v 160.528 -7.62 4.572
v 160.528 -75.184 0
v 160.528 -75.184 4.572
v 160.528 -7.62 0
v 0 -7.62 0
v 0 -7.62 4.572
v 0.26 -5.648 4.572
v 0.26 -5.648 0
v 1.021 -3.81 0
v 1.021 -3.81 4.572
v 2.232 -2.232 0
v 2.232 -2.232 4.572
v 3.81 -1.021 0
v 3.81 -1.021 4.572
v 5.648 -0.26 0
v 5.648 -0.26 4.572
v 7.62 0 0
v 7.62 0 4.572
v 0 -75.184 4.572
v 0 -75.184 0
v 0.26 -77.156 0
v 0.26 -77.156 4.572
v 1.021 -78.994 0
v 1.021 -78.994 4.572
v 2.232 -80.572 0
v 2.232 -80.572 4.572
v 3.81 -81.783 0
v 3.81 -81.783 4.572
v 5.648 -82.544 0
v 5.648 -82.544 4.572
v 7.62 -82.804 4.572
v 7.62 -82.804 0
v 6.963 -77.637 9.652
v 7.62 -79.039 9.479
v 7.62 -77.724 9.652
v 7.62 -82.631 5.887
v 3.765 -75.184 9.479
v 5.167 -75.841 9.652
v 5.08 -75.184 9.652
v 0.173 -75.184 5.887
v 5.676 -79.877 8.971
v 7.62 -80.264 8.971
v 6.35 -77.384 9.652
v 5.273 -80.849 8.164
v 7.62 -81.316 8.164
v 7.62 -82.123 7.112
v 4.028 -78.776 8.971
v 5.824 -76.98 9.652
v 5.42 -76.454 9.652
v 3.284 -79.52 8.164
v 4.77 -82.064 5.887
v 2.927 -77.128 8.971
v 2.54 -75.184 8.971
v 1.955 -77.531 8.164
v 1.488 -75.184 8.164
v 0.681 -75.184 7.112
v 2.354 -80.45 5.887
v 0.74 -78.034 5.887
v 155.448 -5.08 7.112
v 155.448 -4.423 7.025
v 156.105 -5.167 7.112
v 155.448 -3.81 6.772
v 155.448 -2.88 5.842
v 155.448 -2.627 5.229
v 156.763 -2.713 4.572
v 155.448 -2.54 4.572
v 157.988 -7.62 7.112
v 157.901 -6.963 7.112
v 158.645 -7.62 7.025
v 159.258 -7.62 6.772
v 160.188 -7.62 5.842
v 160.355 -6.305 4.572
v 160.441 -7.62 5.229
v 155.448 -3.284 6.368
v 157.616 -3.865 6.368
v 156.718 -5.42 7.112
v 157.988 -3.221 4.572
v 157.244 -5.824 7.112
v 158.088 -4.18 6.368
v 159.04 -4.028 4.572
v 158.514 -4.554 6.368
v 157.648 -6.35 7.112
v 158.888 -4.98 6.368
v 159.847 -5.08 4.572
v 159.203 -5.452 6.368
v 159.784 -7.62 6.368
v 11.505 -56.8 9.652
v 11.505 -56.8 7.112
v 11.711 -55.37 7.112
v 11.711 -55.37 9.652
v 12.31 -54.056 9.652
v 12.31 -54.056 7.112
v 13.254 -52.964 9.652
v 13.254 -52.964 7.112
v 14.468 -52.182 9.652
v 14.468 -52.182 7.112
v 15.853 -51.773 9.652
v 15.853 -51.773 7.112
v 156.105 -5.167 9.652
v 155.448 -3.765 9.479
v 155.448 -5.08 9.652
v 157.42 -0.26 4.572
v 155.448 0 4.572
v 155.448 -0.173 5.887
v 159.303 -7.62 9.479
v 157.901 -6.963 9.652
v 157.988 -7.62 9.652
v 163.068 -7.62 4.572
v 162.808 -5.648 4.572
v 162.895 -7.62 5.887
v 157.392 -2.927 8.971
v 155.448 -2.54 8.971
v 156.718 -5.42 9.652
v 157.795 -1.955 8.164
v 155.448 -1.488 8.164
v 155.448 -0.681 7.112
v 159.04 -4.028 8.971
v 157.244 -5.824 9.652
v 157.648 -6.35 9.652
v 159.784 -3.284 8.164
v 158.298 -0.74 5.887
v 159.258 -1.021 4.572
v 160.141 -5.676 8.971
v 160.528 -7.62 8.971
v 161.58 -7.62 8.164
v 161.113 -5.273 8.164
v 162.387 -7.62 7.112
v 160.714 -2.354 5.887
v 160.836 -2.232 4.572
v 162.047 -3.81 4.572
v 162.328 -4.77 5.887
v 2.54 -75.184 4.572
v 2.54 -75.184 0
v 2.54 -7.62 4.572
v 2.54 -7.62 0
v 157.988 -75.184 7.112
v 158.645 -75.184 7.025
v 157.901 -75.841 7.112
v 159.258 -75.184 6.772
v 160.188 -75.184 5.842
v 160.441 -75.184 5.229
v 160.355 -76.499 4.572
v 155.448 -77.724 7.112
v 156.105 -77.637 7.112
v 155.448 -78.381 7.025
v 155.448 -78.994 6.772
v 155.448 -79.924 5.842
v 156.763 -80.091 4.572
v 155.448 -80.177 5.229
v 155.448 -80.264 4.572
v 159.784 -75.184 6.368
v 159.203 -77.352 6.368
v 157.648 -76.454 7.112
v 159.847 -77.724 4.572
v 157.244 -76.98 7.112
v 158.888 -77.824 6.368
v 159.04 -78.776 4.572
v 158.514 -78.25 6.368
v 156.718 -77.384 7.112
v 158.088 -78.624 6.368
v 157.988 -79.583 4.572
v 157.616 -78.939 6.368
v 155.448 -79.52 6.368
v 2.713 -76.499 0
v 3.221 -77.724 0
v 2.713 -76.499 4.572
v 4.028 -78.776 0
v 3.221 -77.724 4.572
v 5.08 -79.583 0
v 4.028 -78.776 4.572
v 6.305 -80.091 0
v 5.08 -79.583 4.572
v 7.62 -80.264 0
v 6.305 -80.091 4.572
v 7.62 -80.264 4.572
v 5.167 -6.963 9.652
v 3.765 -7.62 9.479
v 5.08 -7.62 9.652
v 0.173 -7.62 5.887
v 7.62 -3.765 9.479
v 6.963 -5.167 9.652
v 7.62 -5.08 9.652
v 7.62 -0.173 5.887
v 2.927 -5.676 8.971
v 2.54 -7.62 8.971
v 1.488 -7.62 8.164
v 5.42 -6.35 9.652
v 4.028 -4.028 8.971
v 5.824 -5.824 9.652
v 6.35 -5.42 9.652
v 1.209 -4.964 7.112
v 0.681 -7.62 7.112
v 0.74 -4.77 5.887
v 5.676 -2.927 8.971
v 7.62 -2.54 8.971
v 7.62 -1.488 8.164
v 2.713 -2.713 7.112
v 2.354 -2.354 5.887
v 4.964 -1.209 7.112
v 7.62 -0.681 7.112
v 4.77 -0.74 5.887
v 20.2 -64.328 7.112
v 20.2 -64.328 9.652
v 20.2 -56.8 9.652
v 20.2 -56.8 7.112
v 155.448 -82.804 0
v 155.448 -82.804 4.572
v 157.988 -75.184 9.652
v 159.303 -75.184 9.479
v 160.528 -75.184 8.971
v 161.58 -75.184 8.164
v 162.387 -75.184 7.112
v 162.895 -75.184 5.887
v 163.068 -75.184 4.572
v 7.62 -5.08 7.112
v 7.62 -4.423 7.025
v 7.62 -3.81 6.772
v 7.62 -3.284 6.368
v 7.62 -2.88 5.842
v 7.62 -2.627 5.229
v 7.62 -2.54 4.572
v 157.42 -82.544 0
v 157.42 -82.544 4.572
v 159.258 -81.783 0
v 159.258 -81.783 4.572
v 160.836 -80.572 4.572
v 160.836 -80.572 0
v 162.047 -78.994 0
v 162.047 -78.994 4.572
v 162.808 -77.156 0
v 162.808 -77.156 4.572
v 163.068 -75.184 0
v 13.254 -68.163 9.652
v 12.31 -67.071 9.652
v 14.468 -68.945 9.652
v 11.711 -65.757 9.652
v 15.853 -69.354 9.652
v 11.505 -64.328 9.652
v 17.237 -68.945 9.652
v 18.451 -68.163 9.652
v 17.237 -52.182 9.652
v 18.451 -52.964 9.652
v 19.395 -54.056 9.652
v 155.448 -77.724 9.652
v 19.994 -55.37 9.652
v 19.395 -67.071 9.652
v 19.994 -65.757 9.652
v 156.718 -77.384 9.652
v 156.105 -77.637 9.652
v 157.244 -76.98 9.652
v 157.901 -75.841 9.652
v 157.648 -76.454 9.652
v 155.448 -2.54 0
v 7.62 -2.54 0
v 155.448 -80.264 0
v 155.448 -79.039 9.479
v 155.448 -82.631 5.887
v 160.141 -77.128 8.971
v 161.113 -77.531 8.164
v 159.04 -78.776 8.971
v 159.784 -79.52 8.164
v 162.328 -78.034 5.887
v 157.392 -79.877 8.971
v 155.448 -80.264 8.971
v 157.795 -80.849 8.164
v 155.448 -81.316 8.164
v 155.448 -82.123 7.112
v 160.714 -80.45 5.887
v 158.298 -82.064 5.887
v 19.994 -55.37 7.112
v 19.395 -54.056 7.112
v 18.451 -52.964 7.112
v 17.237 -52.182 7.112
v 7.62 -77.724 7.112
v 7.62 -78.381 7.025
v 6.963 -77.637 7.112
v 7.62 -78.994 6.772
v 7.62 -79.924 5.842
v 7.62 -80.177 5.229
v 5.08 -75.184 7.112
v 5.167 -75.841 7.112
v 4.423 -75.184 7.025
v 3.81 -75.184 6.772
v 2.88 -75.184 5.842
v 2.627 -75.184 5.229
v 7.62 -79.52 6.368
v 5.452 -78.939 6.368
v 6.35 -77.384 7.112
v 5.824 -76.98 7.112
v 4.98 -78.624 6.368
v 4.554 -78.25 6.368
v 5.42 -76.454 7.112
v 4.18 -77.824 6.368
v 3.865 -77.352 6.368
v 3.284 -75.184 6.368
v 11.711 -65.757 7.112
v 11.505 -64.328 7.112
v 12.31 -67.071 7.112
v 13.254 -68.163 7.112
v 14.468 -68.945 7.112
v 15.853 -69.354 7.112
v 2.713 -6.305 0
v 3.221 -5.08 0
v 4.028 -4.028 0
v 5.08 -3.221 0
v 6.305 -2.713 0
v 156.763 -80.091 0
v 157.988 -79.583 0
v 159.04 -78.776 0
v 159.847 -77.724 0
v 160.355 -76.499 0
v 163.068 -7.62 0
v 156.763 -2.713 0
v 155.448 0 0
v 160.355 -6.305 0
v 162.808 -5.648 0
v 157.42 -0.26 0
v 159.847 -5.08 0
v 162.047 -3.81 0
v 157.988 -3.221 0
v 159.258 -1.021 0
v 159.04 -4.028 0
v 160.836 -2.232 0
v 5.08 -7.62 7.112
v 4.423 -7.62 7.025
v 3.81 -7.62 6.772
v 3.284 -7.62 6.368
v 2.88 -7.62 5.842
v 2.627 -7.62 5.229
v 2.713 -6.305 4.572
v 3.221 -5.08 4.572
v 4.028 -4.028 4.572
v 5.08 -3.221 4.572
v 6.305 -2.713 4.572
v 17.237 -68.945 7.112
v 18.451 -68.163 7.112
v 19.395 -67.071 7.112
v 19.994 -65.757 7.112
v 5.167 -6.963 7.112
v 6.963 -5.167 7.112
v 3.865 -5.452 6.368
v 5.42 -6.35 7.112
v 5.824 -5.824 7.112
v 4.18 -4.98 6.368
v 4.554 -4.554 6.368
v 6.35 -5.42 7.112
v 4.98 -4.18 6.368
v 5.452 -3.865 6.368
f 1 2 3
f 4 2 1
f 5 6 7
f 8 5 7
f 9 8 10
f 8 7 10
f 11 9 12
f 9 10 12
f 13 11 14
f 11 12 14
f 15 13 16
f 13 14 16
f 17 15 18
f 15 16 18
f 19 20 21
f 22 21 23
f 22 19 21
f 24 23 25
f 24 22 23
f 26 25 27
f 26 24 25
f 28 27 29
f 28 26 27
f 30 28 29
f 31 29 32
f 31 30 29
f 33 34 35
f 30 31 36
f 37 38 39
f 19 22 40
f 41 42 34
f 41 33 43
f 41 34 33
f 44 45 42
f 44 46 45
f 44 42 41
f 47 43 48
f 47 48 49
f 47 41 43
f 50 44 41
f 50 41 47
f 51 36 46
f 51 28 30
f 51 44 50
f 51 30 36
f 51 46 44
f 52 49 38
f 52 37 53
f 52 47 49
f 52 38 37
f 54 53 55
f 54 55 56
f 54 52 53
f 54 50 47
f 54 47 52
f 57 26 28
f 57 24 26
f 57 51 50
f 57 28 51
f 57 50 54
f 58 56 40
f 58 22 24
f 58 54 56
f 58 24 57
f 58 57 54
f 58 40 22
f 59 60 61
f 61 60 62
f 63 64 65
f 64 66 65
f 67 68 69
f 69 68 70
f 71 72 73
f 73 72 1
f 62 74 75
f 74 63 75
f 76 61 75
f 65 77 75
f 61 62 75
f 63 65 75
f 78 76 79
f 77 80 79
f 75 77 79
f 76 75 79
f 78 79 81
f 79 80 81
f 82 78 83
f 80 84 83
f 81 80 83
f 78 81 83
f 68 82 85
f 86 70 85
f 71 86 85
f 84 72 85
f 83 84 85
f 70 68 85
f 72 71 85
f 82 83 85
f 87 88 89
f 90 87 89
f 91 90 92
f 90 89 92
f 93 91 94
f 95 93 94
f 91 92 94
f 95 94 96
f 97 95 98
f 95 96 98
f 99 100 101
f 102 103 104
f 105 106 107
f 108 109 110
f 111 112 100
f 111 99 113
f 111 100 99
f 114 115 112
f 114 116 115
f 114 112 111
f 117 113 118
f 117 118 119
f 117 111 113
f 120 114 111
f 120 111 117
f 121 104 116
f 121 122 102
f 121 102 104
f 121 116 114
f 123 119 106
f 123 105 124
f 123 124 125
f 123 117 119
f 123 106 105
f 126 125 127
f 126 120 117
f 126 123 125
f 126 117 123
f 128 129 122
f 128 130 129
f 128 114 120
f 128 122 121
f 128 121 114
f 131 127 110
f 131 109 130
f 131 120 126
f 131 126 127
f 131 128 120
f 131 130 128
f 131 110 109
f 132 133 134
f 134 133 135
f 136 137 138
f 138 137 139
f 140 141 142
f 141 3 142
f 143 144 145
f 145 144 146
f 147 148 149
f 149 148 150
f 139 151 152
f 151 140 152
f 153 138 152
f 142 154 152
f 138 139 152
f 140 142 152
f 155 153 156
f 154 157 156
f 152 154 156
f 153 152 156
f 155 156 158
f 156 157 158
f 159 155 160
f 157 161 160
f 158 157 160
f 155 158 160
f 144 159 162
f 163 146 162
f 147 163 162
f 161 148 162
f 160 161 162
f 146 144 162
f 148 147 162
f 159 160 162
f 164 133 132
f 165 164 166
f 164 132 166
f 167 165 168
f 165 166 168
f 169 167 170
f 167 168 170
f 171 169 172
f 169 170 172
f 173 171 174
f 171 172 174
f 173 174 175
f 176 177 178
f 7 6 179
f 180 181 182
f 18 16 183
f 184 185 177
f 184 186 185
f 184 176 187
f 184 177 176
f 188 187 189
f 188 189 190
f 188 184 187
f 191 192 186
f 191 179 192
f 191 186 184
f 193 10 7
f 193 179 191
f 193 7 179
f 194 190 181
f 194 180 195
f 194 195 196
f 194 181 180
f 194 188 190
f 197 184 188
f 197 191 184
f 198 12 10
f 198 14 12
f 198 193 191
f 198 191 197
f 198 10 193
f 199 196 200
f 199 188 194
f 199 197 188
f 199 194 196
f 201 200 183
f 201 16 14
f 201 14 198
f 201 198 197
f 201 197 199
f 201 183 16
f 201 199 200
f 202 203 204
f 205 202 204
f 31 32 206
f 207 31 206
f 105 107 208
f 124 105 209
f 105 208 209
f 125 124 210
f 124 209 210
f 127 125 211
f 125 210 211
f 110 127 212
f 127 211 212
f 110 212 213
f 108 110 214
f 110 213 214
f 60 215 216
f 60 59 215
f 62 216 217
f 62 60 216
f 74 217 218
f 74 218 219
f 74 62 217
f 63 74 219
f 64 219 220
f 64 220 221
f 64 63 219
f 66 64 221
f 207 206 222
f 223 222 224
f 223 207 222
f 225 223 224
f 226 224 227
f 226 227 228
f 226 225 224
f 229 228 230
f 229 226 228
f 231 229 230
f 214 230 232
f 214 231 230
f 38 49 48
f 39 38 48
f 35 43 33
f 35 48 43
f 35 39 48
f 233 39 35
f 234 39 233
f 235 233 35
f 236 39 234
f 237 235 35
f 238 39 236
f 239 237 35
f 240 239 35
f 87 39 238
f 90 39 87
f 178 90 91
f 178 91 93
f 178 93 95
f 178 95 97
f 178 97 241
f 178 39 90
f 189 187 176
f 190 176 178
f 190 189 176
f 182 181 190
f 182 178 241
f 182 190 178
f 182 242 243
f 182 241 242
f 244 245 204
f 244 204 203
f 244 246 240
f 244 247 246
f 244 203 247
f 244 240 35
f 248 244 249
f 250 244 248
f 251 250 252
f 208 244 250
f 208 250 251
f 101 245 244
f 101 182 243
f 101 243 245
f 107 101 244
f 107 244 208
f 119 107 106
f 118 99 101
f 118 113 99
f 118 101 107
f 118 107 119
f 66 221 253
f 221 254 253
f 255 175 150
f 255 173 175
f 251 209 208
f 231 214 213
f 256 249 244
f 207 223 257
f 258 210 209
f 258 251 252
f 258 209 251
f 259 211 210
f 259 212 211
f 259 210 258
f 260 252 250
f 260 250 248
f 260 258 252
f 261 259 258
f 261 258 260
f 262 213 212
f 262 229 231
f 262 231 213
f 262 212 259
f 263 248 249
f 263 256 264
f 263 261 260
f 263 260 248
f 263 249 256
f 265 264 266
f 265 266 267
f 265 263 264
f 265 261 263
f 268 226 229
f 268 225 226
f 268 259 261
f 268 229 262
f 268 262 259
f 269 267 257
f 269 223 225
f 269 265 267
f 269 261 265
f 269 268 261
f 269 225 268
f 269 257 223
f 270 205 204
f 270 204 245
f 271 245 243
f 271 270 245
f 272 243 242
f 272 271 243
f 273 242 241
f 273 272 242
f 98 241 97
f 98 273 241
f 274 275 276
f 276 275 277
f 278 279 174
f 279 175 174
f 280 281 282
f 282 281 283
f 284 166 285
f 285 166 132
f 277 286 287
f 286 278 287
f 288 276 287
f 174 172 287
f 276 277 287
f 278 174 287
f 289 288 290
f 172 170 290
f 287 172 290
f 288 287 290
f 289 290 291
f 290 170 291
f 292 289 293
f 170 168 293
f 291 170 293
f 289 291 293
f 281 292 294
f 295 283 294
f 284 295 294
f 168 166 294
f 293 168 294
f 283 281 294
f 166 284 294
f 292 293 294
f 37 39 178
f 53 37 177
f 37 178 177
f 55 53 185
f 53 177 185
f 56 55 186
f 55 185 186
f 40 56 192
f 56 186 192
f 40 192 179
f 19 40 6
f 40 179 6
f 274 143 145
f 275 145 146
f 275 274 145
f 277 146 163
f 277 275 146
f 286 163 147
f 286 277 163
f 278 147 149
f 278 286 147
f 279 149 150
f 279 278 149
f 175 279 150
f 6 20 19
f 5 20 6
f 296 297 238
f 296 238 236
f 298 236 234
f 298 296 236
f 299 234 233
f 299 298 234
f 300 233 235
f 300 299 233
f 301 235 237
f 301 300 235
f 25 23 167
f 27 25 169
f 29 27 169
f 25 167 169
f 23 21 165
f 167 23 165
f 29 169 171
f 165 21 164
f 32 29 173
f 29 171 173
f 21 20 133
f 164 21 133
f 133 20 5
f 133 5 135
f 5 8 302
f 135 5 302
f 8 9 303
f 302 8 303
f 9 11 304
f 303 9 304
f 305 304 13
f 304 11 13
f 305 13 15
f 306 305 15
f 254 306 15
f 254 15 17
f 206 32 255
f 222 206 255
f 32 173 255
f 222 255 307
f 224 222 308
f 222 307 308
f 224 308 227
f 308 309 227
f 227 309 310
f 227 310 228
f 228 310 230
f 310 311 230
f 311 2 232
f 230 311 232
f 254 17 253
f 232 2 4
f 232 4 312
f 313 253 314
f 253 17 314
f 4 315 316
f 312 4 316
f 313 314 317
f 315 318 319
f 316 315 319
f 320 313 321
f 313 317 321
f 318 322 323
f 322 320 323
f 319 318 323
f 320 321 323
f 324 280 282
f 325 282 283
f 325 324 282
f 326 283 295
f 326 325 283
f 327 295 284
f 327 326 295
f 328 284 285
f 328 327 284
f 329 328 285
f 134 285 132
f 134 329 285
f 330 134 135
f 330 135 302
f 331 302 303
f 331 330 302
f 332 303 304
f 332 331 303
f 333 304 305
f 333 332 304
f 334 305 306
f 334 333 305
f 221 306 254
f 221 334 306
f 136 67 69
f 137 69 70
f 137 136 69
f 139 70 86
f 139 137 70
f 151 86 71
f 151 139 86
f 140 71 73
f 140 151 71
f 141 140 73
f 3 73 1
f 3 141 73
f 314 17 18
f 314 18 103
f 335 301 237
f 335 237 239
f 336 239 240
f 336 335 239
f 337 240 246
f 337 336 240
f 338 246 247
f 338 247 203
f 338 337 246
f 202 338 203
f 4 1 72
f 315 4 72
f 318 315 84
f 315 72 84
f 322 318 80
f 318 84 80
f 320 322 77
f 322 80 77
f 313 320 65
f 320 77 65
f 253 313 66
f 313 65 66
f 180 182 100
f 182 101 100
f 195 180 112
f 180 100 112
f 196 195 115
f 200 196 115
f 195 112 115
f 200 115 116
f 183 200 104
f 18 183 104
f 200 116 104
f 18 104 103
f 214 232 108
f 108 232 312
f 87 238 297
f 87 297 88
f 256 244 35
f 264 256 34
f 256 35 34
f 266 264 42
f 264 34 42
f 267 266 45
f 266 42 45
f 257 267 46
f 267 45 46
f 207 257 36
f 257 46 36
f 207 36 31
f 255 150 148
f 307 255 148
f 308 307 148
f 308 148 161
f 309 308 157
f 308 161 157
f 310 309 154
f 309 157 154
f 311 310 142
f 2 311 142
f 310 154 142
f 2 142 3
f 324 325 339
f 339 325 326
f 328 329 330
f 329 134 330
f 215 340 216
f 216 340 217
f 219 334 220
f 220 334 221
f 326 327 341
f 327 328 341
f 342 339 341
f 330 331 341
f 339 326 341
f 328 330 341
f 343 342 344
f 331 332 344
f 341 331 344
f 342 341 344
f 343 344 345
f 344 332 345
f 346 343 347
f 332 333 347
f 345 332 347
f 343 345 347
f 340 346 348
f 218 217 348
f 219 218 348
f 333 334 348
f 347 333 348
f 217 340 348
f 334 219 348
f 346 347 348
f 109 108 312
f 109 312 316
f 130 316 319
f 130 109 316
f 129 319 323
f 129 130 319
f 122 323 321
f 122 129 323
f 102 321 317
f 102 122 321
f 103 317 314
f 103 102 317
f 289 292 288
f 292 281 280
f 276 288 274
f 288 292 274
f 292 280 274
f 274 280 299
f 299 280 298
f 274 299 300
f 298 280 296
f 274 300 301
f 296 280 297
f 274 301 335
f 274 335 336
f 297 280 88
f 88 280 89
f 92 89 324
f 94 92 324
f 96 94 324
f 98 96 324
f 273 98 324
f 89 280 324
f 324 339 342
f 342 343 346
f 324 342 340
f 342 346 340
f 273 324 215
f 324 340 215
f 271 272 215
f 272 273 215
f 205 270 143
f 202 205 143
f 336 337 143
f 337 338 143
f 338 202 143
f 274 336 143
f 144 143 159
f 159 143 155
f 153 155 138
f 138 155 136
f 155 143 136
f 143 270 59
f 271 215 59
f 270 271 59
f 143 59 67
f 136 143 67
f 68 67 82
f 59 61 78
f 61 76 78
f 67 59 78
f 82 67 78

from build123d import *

# Parameters (mm, degrees)
F0_W        = 163.068
F0_H        = 82.804
F1_DEPTH    = 9.652
F2_R        = 7.62
F3_R        = 5.08
F4_T        = -2.54
F6_W        = 8.6941672489
F6_H        = 17.6881290972
F7_DEPTH    = 25.4
F8_T1_DEPTH = 2.54


# Not quite as in the source:
# - a fillet or chamfer that OpenCascade refuses, or shapes differently, is made with other operations: its cross-section is extruded or revolved along the edge and cut away or added


with BuildPart() as f1:
    # F0 (on Top) → F1 (new body)
    with BuildSketch(Plane.XY):
        with Locations((81.534, -41.402)):
            Rectangle(F0_W, F0_H)
    extrude(amount=F1_DEPTH)

    # F2
    f2_edges = [f1.edges().sort_by_distance(p)[0] for p in [
        (0, 0, 4.826),
        (163.068, 0, 4.826),
        (163.068, -82.804, 4.826),
        (0, -82.804, 4.826),
    ]]
    fillet(f2_edges, radius=F2_R)

    # F3
    f3_edges = [f1.edges().sort_by_distance(p)[0] for p in [
        (81.534, 0, 9.652),
        (160.836154, -2.231846, 9.652),
        (2.231846, -2.231846, 9.652),
        (163.068, -41.402, 9.652),
        (0, -41.402, 9.652),
        (160.836154, -80.572154, 9.652),
        (2.231846, -80.572154, 9.652),
        (81.534, -82.804, 9.652),
    ]]
    fillet(f3_edges, radius=F3_R)

    # F4
    f4_openings = [f1.faces().sort_by_distance(p)[0] for p in [
        (81.534, -41.402, 0),
    ]]
    offset(amount=F4_T, openings=f4_openings)

    # F6 (on face) → F7 (cut)
    with BuildSketch(Plane.XY.offset(9.652)):
        with Locations((15.8525095321, -60.5635698885)):
            Rectangle(F6_W, F6_H)
    extrude(amount=-F7_DEPTH, mode=Mode.SUBTRACT)

    # F8: fillet of radius 5.08 on 4 edges, made by hand

    # F8_s2 → F8_t1 (join)
    with BuildSketch(Plane.XY.offset(7.112)):
        with BuildLine():
            ThreePointArc((11.5054259077, -56.7995053399), (12.9933234592, -53.2074028914), (16.5854259077, -51.7195053399))
            Line((16.5854259077, -51.7195053399), (11.5054259077, -51.7195053399))
            Line((11.5054259077, -51.7195053399), (11.5054259077, -56.7995053399))
        make_face()
        with BuildLine():
            ThreePointArc((11.5054259077, -64.3276344371), (12.9933234592, -67.9197368855), (16.5854259077, -69.4076344371))
            Line((16.5854259077, -69.4076344371), (11.5054259077, -69.4076344371))
            Line((11.5054259077, -69.4076344371), (11.5054259077, -64.3276344371))
        make_face()
        with BuildLine():
            ThreePointArc((20.1995931566, -56.7995053399), (18.711695605, -53.2074028914), (15.1195931566, -51.7195053399))
            Line((15.1195931566, -51.7195053399), (20.1995931566, -51.7195053399))
            Line((20.1995931566, -51.7195053399), (20.1995931566, -56.7995053399))
        make_face()
        with BuildLine():
            ThreePointArc((15.1195931566, -69.4076344371), (18.711695605, -67.9197368855), (20.1995931566, -64.3276344371))
            Line((20.1995931566, -64.3276344371), (20.1995931566, -69.4076344371))
            Line((20.1995931566, -69.4076344371), (15.1195931566, -69.4076344371))
        make_face()
    extrude(amount=F8_T1_DEPTH)


solid = f1.part
